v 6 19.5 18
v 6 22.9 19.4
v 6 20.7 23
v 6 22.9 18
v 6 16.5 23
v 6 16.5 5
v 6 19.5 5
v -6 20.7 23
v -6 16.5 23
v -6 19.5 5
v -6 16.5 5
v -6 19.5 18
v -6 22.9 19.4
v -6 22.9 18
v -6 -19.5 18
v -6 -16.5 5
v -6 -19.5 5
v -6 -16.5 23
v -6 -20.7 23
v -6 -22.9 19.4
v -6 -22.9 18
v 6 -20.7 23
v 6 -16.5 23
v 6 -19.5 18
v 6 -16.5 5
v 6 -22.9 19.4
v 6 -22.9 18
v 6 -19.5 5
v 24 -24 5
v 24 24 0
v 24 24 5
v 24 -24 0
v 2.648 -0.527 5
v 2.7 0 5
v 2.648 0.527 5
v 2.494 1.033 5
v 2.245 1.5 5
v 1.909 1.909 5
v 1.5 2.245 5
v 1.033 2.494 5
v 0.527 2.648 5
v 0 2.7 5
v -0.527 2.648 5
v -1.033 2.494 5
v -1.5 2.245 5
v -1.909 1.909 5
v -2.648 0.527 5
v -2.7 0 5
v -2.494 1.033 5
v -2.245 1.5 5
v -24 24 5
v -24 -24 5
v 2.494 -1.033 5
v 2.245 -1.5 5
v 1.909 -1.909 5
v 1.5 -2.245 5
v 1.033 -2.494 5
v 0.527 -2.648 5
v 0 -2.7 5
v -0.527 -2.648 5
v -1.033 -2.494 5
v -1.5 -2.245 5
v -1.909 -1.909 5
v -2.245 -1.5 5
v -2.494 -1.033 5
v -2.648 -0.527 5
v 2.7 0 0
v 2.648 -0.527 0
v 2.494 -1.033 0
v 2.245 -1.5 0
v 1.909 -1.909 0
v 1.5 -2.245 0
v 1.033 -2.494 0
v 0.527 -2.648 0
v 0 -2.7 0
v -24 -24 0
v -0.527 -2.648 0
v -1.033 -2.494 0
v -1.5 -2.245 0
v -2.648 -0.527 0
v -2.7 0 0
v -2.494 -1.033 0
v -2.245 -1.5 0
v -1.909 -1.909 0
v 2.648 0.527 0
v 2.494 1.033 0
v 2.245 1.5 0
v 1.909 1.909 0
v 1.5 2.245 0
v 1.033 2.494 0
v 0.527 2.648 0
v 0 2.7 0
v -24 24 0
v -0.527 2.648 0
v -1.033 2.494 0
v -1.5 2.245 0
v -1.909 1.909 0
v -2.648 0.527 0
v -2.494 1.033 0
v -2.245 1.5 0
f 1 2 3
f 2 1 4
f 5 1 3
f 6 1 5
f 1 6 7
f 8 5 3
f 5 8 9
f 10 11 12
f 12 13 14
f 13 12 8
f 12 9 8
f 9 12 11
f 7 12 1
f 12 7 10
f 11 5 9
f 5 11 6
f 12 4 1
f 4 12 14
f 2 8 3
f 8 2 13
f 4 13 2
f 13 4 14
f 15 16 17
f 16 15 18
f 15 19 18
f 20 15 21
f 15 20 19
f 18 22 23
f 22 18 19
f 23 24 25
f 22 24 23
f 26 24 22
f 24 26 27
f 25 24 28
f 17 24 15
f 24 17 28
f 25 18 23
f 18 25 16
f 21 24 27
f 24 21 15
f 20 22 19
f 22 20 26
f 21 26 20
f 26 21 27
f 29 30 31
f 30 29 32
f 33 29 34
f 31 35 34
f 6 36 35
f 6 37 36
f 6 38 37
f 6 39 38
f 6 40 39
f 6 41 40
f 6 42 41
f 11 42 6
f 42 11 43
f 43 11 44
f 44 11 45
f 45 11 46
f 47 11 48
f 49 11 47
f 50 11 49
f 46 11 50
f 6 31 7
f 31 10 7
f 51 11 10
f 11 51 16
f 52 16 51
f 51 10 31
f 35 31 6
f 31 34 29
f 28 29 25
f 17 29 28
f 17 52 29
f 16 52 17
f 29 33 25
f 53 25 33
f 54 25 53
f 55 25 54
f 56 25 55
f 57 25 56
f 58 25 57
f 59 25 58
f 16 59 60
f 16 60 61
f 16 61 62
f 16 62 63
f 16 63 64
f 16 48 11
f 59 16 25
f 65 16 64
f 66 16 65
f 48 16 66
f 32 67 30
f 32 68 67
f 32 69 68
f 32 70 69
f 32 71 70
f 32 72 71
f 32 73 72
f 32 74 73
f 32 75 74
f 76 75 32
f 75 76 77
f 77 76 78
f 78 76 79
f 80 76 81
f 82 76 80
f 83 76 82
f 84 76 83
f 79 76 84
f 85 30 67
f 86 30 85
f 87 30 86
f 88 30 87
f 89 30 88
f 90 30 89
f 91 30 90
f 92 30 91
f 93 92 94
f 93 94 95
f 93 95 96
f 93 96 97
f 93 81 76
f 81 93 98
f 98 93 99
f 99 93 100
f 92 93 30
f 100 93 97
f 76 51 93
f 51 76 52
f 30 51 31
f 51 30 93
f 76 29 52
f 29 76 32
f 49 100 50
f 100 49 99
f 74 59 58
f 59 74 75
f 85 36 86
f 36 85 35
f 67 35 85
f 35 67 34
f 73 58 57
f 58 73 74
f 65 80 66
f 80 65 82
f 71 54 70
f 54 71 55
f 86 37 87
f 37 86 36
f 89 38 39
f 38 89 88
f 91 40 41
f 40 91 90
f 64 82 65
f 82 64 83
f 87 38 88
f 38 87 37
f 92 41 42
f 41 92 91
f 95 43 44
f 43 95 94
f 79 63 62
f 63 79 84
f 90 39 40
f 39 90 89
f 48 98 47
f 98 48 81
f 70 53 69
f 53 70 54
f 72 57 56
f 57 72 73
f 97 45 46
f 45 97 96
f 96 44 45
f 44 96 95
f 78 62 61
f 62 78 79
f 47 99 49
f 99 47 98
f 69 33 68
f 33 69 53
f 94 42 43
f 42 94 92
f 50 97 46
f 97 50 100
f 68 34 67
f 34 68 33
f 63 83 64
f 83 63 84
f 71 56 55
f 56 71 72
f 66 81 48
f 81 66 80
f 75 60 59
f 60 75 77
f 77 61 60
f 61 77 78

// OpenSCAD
$fn = 32;

// ----------------------------------------------------------------------
// Snap-fit latch: 2 arms, 18 mm tall, 3.6 mm undercut hooks
// ----------------------------------------------------------------------

// --- parameters (mm) ---
base_d = 48;              // base plate depth
base_h = 5;               // base plate thickness
span = 36;                // distance between opposite arms
arm_t = 3;                // arm thickness
arm_d = 12;               // arm width
height = 18;              // free arm length
head_len = 3.6;           // hook reach
head_h = 5;               // hook height
lead = 1.4;               // lead-in ramp thickness
bore_d = 5.4;             // base fixing bore
top_z = 23;               // height of the arm tips above the base

arms = 2;

difference() {
  union() {
    /* base plate, centred on the arm ring */
    translate([-24, -24, 0]) cube([base_d, base_d, base_h]);
    for (a = [0 : 360 / arms : 359]) rotate([0, 0, a]) {
    /* arm, sunk 0.5 mm into the base */
    translate([-arm_d / 2, span / 2 - arm_t / 2, base_h - 0.5]) cube([arm_d, arm_t, height + 0.5]);
    /* hook: a convex hull of a tall inner block and a thin outer lip
       gives a flat undercut below and a lead-in ramp on top */
    hull() {
      translate([-arm_d / 2, span / 2 + arm_t / 2 - 0.6, top_z - head_h]) cube([arm_d, lead + 0.4, head_h]);
      translate([-arm_d / 2, span / 2 + arm_t / 2 - 0.2, top_z - head_h]) cube([arm_d, head_len, lead]);
    }
    }
  }
  translate([0, 0, -2.5]) cylinder(h = base_h + 5, d = bore_d);
}
